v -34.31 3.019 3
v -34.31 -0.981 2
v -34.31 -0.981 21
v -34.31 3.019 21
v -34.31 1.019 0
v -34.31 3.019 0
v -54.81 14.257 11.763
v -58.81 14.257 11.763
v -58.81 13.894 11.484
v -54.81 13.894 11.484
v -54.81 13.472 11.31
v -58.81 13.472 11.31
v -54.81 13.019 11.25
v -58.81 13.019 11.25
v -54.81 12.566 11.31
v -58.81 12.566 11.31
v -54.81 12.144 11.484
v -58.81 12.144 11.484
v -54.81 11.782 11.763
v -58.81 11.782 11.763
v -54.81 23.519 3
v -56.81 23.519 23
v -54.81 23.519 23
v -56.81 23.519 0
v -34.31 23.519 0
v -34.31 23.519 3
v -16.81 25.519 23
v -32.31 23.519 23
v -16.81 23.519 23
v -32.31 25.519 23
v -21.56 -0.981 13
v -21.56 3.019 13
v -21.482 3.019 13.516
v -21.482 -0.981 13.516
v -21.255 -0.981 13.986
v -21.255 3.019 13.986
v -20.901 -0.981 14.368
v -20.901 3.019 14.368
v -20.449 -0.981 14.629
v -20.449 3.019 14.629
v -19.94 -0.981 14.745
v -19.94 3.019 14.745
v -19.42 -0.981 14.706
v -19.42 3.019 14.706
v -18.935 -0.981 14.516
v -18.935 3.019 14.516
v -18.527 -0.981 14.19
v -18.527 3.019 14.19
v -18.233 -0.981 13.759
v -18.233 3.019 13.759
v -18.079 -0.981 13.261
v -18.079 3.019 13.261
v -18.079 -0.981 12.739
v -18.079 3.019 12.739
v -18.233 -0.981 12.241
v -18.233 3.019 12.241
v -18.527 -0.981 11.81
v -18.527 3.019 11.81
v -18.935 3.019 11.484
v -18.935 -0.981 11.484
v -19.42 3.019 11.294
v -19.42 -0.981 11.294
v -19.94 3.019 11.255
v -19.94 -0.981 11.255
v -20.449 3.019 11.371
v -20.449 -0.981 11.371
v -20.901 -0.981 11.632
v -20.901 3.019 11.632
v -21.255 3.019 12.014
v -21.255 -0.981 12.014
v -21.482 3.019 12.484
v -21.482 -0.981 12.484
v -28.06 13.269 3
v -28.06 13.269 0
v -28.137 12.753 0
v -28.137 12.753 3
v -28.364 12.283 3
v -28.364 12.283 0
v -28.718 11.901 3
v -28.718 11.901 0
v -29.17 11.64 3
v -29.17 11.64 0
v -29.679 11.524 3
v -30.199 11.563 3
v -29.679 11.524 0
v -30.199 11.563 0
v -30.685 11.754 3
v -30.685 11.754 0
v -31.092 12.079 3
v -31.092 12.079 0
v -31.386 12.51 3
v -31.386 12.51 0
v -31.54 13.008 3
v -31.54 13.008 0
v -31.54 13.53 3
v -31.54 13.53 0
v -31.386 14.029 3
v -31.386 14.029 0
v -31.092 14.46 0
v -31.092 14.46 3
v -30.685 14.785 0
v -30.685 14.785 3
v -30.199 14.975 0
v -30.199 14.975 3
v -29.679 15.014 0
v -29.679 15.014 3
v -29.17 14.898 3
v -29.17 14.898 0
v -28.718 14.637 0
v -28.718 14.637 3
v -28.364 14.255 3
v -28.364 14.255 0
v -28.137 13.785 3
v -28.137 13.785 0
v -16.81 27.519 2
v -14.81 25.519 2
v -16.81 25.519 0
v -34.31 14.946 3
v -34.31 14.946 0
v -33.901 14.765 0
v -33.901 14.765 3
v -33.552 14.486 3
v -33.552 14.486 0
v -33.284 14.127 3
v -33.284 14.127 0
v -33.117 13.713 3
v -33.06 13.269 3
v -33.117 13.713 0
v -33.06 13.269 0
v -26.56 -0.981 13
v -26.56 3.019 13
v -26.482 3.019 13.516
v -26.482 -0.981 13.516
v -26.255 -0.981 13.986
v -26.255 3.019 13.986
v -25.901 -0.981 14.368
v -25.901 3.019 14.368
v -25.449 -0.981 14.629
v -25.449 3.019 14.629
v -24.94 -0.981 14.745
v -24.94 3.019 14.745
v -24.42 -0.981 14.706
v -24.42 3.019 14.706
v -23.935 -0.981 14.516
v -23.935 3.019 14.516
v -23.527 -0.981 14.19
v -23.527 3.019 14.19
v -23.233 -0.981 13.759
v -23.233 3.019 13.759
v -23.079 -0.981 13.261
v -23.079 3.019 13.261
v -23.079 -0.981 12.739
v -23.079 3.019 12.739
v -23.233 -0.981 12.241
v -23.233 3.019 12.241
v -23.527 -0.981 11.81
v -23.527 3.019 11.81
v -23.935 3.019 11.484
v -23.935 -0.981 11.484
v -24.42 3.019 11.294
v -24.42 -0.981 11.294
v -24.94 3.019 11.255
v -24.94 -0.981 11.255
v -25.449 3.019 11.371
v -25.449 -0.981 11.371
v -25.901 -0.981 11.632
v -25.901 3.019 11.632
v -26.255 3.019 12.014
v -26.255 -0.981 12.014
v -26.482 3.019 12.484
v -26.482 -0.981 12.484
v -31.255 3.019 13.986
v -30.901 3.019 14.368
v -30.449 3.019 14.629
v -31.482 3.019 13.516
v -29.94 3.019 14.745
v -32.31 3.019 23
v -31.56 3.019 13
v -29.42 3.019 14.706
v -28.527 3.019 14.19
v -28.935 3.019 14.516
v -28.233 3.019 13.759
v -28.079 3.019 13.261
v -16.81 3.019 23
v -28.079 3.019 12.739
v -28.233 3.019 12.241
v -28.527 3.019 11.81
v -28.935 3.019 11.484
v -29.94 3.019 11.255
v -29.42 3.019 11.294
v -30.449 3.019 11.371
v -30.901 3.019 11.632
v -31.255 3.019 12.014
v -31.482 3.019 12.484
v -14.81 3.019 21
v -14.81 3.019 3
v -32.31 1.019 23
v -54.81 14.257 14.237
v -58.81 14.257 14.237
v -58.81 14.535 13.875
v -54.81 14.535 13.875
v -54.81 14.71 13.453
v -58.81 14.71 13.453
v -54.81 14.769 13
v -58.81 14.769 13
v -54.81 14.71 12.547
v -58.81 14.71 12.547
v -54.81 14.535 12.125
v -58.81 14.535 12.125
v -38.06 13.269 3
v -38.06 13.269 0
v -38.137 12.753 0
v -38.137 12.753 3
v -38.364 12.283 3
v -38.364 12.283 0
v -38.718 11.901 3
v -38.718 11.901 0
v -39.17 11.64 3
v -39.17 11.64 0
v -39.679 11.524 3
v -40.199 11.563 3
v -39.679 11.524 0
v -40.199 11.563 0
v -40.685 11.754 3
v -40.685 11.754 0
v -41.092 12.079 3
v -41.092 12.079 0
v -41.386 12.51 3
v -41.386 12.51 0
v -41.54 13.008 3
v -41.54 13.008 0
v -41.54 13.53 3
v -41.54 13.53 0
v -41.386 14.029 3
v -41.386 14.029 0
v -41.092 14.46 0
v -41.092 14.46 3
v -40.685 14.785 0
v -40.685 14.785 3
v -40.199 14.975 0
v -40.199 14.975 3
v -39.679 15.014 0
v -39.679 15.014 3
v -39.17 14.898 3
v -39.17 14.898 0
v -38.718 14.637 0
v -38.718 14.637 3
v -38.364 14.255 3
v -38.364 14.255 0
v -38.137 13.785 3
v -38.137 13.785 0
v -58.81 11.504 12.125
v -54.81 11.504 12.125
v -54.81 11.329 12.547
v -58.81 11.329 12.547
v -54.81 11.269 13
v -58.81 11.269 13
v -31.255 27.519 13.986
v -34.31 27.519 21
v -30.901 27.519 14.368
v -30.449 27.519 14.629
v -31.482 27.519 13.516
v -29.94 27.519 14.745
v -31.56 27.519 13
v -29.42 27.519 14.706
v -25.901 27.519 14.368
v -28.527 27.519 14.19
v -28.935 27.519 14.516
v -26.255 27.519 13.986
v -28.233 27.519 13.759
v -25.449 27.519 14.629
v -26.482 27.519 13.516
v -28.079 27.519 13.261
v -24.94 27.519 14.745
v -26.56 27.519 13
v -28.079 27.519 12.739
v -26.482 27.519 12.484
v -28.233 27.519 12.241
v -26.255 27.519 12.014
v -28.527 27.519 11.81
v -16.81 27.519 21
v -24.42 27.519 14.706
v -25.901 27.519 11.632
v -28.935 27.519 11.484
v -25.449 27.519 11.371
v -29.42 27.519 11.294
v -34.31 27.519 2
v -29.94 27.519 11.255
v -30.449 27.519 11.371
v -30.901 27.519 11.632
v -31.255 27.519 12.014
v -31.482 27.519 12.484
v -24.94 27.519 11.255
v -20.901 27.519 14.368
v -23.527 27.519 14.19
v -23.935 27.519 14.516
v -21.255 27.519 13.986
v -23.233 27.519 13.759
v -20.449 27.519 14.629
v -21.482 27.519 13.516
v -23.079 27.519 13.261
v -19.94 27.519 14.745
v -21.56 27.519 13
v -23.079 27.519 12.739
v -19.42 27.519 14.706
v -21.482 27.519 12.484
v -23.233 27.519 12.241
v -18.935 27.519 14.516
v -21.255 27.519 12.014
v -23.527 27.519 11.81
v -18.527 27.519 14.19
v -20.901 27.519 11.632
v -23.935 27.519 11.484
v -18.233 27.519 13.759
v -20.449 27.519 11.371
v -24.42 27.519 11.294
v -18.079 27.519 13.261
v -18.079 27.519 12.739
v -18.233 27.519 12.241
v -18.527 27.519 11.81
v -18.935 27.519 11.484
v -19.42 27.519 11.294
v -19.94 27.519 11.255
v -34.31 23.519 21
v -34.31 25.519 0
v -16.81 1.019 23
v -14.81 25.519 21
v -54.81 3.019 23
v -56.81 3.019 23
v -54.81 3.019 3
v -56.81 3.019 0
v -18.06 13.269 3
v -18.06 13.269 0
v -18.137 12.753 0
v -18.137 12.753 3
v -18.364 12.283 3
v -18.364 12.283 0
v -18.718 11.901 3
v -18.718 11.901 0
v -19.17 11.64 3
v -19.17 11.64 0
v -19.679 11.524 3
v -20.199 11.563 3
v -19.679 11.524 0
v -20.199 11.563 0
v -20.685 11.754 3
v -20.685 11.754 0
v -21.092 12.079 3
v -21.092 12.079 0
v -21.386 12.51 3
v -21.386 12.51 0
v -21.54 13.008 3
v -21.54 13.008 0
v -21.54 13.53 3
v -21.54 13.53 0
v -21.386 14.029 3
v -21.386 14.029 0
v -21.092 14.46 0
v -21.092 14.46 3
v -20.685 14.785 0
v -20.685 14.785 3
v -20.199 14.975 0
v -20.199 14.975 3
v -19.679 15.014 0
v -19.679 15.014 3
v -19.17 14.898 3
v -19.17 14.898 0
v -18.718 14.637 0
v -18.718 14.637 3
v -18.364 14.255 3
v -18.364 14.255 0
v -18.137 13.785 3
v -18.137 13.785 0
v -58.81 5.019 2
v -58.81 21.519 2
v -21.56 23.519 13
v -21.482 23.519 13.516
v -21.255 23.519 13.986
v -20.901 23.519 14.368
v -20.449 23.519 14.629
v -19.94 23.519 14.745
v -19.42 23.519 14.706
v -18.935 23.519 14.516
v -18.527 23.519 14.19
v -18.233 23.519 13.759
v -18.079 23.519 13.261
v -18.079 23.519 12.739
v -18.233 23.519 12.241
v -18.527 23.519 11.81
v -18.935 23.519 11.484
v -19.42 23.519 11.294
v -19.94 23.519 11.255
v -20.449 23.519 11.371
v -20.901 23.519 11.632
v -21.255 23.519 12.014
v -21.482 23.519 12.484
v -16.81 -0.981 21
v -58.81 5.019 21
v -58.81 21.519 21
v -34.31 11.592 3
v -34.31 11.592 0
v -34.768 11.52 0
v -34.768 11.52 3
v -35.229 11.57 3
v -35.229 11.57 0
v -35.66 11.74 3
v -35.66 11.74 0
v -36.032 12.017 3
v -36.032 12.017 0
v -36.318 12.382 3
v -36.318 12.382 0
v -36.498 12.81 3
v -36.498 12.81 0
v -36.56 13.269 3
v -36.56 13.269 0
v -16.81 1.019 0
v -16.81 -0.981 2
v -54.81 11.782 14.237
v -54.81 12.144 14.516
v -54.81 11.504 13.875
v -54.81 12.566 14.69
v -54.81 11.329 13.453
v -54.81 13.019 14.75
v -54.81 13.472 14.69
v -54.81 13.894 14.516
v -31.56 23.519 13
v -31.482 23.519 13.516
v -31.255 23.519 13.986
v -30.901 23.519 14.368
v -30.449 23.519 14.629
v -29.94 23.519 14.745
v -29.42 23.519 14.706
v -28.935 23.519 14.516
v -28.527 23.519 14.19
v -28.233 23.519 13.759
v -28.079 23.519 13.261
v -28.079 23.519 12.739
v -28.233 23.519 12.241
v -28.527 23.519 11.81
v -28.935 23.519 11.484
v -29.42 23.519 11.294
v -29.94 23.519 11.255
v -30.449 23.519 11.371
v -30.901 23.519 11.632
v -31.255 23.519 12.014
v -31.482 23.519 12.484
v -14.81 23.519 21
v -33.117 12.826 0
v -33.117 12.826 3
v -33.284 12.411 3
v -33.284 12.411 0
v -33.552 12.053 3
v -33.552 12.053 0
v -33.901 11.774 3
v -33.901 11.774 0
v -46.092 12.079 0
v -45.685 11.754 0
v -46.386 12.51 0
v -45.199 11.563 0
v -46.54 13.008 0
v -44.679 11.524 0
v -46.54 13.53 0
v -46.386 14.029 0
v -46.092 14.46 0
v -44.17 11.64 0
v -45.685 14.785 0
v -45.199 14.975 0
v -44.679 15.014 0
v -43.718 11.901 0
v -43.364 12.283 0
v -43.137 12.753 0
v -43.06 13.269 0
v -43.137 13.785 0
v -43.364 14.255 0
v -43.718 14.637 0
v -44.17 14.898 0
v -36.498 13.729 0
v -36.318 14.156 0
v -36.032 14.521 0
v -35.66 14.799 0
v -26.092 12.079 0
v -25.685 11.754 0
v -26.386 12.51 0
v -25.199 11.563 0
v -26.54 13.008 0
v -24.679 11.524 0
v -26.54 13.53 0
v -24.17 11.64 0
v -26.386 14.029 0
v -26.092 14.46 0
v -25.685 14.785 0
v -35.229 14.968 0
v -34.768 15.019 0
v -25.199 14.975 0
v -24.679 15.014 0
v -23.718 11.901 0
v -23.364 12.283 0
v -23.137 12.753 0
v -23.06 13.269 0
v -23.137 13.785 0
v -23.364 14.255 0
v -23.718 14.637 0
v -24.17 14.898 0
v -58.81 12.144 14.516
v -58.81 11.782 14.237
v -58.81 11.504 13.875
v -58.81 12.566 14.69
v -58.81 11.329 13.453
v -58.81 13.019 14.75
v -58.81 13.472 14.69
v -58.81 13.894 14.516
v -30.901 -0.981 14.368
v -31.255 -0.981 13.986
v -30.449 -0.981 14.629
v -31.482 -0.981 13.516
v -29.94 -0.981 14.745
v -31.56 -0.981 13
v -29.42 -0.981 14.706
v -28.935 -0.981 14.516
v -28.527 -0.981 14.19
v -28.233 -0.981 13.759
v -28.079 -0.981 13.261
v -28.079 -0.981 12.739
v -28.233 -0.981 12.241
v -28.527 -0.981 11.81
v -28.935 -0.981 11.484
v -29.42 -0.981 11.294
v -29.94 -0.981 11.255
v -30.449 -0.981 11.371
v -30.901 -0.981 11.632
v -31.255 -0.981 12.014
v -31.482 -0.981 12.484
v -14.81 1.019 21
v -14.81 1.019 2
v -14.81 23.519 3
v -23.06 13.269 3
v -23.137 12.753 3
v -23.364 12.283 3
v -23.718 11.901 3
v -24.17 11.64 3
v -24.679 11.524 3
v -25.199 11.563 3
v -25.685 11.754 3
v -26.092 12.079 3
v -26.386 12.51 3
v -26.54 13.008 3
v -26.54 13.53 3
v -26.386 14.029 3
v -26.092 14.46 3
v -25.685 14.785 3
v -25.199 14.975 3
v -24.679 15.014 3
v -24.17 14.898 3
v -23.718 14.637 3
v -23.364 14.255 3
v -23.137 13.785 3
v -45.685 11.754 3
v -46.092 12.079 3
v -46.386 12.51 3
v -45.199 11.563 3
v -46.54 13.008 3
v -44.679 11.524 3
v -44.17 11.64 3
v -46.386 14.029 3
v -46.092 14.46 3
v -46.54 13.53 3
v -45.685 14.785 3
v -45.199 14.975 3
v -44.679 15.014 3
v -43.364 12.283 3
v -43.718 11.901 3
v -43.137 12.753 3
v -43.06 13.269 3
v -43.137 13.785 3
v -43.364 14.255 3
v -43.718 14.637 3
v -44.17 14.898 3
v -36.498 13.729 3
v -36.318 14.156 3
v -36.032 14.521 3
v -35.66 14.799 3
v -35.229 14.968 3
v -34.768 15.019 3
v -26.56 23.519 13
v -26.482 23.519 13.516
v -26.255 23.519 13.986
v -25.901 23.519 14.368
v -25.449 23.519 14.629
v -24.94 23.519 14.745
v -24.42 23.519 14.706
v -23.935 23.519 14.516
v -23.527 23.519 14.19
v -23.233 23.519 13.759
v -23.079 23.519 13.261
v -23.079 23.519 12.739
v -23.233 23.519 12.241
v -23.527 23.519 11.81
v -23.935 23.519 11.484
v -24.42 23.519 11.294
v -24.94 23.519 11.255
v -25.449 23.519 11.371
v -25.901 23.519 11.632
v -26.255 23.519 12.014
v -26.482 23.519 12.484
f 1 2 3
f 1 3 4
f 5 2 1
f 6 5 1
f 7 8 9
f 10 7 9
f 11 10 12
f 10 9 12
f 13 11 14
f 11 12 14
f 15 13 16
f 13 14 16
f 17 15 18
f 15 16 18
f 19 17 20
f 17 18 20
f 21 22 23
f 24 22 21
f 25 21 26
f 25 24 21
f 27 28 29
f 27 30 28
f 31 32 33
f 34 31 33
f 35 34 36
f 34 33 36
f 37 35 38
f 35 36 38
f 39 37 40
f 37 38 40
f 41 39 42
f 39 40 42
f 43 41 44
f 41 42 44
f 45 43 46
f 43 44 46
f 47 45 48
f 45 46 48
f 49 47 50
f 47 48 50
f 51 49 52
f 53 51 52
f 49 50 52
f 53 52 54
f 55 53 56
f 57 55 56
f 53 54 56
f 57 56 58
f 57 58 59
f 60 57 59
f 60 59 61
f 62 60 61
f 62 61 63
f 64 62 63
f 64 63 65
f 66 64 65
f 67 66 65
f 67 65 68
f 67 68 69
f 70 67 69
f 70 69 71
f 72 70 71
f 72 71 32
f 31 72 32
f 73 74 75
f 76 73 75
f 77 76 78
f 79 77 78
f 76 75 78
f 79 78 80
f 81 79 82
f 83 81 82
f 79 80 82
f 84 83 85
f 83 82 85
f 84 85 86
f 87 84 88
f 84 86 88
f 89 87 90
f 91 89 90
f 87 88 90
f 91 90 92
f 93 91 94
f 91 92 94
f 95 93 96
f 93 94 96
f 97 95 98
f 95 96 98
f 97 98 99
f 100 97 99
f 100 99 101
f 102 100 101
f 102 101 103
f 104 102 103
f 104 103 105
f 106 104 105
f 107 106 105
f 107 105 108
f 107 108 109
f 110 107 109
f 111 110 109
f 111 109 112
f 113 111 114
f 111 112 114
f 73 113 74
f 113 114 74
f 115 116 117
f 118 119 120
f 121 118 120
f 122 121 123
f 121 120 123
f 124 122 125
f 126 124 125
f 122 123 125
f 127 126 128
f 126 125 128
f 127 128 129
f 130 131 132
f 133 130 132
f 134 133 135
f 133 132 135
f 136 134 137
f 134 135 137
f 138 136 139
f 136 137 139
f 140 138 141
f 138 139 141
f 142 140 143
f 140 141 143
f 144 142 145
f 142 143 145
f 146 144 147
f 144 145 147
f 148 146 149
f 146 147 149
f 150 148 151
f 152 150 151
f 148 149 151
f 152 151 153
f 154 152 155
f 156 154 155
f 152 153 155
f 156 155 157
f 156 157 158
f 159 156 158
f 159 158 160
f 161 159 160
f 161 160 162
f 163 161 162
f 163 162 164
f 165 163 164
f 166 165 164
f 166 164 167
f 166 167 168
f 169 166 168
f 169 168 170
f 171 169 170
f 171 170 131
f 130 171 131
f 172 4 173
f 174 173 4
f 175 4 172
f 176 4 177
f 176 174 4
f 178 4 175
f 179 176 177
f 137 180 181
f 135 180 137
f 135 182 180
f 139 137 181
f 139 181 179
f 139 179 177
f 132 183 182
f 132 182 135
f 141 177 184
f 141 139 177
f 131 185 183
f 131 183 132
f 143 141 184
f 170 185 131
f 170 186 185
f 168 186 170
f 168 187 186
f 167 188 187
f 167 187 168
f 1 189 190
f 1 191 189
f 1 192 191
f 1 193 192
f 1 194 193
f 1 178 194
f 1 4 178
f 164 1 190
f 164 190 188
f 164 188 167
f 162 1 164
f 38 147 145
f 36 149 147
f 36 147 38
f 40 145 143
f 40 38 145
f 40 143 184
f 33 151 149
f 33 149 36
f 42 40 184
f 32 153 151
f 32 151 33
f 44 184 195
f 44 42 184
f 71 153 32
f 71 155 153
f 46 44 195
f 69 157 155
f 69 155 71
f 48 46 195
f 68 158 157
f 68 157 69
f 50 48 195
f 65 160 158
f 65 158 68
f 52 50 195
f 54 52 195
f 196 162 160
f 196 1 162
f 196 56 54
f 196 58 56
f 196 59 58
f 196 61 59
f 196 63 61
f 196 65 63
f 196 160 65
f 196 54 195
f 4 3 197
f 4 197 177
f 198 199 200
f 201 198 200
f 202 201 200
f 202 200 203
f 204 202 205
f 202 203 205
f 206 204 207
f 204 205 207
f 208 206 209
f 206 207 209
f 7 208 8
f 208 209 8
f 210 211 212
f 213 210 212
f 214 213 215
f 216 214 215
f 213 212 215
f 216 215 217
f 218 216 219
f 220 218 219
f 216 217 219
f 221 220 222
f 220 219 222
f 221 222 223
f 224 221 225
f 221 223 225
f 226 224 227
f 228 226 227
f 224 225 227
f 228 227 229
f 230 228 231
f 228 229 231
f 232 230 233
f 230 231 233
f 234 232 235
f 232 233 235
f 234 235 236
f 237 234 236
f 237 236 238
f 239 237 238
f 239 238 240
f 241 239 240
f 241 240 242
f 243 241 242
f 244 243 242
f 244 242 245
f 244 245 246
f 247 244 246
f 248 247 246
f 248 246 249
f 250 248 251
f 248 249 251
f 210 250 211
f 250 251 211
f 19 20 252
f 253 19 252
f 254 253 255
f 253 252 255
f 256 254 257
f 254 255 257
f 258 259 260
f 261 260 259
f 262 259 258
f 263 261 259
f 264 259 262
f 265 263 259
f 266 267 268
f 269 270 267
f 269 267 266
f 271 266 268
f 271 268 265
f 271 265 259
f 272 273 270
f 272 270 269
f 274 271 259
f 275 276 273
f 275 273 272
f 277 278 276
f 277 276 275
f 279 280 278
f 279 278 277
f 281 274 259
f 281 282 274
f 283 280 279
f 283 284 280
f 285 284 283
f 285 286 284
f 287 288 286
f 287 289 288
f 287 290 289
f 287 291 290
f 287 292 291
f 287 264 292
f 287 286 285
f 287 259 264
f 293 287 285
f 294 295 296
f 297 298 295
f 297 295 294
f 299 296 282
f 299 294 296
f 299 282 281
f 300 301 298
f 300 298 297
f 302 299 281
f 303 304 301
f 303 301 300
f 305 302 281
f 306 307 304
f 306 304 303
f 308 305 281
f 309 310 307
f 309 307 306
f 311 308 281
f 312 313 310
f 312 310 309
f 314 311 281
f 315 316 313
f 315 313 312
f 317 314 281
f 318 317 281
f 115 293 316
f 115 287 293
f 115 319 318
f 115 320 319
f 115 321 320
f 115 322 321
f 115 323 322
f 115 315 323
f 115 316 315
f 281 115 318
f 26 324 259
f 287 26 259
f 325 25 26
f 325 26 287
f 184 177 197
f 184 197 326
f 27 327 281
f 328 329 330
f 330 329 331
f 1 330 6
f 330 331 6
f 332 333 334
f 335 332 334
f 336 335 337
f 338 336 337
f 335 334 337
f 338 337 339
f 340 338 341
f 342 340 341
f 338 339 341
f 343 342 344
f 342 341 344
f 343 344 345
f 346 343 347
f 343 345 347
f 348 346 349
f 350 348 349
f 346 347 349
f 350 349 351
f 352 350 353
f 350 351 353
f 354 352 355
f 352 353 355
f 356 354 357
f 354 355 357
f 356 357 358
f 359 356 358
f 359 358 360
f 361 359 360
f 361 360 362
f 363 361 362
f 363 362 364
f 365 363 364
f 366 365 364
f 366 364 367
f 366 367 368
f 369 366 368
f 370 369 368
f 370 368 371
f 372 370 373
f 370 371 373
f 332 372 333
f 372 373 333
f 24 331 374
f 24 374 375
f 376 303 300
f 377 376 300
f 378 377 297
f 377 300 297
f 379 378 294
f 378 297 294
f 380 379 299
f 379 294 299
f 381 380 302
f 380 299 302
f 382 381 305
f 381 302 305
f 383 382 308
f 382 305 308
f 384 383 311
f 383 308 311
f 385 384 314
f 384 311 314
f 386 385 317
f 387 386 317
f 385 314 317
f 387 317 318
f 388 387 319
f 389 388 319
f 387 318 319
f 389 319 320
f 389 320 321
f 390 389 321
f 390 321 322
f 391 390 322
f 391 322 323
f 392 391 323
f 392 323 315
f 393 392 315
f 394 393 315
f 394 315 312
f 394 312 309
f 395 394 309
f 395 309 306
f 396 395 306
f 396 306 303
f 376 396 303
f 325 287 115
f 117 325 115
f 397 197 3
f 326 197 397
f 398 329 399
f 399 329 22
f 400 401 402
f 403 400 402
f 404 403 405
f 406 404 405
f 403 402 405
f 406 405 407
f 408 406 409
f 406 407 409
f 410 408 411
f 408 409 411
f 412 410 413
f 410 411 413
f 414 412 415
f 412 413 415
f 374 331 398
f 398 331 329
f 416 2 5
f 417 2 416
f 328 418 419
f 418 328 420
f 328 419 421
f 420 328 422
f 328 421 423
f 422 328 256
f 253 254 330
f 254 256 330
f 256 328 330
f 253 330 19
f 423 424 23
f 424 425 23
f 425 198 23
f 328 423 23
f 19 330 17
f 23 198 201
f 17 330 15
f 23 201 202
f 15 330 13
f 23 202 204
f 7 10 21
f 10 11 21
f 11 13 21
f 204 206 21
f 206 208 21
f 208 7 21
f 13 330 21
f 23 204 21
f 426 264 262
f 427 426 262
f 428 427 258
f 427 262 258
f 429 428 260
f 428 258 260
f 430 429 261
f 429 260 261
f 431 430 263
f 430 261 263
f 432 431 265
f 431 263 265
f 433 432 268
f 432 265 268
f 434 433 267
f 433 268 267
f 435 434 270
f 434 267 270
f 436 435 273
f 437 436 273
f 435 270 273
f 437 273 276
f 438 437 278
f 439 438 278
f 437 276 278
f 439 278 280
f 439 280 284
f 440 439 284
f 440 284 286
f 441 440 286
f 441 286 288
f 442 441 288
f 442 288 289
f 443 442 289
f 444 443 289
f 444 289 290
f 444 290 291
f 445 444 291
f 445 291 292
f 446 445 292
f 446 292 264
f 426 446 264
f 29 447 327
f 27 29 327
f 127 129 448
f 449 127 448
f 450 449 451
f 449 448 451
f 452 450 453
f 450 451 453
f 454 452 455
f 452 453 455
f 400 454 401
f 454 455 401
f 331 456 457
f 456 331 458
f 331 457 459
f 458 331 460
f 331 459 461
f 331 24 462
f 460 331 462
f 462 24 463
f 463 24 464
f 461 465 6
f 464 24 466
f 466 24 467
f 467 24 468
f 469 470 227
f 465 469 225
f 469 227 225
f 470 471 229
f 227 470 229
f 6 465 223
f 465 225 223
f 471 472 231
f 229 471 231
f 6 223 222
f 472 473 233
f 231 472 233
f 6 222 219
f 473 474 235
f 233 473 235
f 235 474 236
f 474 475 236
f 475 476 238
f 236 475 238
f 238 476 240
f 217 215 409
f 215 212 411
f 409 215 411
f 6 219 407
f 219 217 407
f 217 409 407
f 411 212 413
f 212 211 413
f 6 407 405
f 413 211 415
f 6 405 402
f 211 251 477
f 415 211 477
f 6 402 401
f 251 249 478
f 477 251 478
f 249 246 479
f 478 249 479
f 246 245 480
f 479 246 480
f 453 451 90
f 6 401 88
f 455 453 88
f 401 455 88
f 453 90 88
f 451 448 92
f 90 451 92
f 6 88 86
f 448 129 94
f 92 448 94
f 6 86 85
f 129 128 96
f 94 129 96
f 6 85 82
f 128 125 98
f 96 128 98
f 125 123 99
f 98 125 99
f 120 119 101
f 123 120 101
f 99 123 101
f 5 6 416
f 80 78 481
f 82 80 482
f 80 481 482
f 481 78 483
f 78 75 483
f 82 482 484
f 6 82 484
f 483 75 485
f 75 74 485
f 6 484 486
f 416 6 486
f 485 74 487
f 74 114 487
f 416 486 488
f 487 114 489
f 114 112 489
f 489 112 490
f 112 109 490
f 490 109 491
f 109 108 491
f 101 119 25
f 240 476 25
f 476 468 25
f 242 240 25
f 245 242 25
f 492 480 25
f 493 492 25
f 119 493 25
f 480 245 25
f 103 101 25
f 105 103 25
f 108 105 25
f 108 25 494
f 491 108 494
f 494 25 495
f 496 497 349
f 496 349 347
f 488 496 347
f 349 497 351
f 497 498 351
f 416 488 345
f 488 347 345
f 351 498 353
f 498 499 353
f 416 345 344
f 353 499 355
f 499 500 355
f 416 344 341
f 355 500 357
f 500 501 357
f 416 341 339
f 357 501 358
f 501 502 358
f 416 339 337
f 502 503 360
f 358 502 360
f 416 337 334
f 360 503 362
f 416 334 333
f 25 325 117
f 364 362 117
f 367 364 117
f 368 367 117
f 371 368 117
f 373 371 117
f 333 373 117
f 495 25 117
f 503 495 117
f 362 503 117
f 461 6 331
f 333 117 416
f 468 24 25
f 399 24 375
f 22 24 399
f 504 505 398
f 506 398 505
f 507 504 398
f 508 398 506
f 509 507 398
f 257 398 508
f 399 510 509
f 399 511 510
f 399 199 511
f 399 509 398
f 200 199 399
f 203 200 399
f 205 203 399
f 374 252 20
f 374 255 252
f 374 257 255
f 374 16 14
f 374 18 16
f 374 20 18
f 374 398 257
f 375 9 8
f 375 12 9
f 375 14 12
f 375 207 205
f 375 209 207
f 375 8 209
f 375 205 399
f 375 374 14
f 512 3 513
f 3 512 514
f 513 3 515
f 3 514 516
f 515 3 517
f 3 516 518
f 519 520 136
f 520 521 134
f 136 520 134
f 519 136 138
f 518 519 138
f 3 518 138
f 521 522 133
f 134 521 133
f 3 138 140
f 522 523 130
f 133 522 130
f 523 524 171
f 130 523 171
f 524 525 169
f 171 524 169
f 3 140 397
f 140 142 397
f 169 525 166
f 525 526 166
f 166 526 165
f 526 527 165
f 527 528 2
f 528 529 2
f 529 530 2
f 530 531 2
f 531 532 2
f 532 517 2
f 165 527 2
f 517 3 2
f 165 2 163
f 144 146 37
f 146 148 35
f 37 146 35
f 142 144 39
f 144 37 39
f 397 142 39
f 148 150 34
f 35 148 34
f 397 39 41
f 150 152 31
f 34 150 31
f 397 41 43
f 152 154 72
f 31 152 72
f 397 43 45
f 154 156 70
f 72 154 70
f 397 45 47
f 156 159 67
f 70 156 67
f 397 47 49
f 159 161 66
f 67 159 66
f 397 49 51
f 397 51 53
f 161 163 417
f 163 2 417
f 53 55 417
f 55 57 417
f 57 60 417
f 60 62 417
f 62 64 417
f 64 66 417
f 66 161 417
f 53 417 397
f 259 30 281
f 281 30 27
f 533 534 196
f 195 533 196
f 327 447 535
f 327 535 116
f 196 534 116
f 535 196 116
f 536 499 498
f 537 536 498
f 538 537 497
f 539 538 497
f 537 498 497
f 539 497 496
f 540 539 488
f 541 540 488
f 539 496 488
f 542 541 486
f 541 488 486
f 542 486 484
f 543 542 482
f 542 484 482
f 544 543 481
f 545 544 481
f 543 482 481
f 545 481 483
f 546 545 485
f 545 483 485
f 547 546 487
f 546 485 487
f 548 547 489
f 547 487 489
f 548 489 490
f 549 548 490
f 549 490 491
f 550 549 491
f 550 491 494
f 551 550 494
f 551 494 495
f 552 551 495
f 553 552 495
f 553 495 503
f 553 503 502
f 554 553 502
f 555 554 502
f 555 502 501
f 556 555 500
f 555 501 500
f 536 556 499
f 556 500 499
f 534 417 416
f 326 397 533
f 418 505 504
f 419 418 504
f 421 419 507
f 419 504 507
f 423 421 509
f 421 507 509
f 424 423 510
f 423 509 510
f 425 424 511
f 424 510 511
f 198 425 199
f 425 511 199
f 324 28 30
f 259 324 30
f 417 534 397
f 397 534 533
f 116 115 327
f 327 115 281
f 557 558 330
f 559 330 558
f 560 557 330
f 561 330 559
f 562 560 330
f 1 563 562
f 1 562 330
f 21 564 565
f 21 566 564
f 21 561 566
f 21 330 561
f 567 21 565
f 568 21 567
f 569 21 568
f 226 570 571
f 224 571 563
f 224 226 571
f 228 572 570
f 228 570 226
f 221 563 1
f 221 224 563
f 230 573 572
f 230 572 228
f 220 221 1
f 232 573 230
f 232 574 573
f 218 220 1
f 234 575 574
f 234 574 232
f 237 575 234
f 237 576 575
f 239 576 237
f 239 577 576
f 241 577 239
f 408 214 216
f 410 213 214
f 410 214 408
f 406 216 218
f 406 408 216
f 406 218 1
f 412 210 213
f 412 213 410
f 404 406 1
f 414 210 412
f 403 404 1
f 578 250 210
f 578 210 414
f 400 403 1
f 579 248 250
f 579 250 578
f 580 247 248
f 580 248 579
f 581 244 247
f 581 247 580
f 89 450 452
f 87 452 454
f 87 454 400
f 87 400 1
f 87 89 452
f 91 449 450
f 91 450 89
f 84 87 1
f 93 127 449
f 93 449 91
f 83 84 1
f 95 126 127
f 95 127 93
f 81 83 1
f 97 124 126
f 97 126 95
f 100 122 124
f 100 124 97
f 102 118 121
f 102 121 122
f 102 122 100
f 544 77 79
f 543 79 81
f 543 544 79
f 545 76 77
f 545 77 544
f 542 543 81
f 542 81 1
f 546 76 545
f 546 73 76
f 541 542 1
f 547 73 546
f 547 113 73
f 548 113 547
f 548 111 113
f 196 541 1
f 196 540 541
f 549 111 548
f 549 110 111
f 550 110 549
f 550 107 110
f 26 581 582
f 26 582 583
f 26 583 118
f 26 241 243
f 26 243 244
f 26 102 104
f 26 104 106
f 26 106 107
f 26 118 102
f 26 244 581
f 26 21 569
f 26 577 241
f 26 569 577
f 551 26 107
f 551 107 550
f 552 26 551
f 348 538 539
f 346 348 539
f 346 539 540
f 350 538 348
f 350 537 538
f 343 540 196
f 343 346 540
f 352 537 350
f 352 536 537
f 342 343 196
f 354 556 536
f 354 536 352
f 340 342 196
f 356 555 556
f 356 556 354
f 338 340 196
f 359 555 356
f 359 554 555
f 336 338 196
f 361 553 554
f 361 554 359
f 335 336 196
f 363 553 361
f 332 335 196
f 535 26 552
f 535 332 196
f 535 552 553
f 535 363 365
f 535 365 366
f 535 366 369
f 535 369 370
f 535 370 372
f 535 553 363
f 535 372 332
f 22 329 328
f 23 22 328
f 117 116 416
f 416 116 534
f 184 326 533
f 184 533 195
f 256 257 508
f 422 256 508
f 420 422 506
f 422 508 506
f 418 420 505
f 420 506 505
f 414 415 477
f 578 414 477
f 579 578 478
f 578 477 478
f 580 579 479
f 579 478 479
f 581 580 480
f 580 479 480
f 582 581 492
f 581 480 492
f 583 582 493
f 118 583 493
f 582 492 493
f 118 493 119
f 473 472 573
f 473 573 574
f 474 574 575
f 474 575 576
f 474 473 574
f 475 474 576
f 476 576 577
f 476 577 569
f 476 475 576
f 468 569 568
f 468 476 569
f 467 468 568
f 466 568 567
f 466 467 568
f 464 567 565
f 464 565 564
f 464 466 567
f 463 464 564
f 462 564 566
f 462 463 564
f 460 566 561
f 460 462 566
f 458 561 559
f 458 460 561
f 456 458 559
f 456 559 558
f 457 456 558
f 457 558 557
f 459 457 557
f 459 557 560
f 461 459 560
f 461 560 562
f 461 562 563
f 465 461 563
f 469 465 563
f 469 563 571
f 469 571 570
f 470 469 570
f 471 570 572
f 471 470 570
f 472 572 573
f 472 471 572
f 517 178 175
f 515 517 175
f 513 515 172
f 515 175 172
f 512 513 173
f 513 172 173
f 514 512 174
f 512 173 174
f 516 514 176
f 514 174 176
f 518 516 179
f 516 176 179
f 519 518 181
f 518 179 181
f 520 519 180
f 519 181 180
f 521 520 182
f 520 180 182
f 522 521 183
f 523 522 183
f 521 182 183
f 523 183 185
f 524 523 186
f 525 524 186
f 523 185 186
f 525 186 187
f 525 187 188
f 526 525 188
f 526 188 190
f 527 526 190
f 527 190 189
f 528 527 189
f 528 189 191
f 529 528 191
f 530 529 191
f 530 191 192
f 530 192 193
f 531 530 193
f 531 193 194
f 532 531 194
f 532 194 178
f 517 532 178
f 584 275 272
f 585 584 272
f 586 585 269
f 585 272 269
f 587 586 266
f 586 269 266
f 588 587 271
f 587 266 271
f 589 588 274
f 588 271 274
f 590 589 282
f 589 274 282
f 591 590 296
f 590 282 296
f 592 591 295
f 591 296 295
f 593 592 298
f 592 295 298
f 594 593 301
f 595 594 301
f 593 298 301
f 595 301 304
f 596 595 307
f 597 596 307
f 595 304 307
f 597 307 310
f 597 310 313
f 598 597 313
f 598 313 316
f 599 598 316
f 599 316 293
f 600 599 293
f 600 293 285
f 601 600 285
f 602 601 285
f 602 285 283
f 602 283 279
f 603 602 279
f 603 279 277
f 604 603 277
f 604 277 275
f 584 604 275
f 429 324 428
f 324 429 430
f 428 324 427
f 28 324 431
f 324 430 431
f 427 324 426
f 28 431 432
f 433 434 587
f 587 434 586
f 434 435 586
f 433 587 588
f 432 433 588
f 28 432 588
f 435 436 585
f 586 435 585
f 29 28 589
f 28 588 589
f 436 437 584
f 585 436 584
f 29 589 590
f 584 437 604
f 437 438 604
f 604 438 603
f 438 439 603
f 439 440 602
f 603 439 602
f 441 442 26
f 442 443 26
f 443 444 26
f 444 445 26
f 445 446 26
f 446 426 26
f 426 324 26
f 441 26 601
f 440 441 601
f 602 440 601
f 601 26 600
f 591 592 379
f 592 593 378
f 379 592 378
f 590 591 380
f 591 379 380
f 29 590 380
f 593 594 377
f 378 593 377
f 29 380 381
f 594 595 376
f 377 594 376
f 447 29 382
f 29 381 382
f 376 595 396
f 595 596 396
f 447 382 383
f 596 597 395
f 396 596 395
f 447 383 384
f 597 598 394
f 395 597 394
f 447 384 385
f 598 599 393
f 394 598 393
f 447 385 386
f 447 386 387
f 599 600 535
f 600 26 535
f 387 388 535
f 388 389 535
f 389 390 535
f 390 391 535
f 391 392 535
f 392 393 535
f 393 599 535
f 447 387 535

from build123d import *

# Parameters (mm, degrees)
F0_R     = 1.75
F1_DEPTH = 3
F0_W     = 4
F0_H     = 20.5
F0_W_2   = 19.5
F0_H_2   = 4
F2_DEPTH = 23
F3_R     = 1.75
F4_DEPTH = 28.501
F6_DEPTH = 25
F7_SIZE  = 2


with BuildPart() as f1:
    # F0 (on Top) → F1 (new body)
    with BuildSketch(Plane.XY):
        with BuildLine():
            Line((-34.3095597923, 23.5192315383), (-54.8095597923, 23.5192315383))
            Line((-54.8095597923, 23.5192315383), (-54.8095597923, 3.0192315383))
            Line((-54.8095597923, 3.0192315383), (-34.3095597923, 3.0192315383))
            Line((-34.3095597923, 3.0192315383), (-34.3095597923, 11.5921805552))
            ThreePointArc((-34.3095597923, 11.5921805552), (-35.8553848254, 11.8661100182), (-36.5595597923, 13.2692315383))
            ThreePointArc((-36.5595597923, 13.2692315383), (-35.8553848254, 14.6723530583), (-34.3095597923, 14.9462825214))
            Line((-34.3095597923, 14.9462825214), (-34.3095597923, 23.5192315383))
        make_face()
        with Locations((-44.8095597923, 13.2692315383)):
            Circle(F0_R, mode=Mode.SUBTRACT)
        with BuildLine():
            ThreePointArc((-41.5595597923, 13.2692315383), (-39.8095597923, 15.0192315383), (-38.0595597923, 13.2692315383))
            ThreePointArc((-38.0595597923, 13.2692315383), (-39.8095597923, 11.5192315383), (-41.5595597923, 13.2692315383))
        make_face(mode=Mode.SUBTRACT)
        with BuildLine():
            Line((-14.8095597923, 23.5192315383), (-34.3095597923, 23.5192315383))
            Line((-34.3095597923, 23.5192315383), (-34.3095597923, 14.9462825214))
            ThreePointArc((-34.3095597923, 14.9462825214), (-33.4064382722, 14.3150565715), (-33.0595597923, 13.2692315383))
            Line((-33.0595597923, 13.2692315383), (-31.5595597923, 13.2692315383))
            ThreePointArc((-31.5595597923, 13.2692315383), (-29.8095597923, 15.0192315383), (-28.0595597923, 13.2692315383))
            Line((-28.0595597923, 13.2692315383), (-26.5595597923, 13.2692315383))
            ThreePointArc((-26.5595597923, 13.2692315383), (-24.8095597923, 15.0192315383), (-23.0595597923, 13.2692315383))
            Line((-23.0595597923, 13.2692315383), (-21.5595597923, 13.2692315383))
            ThreePointArc((-21.5595597923, 13.2692315383), (-19.8095597923, 15.0192315383), (-18.0595597923, 13.2692315383))
            Line((-18.0595597923, 13.2692315383), (-14.8095597923, 13.2692315383))
            Line((-14.8095597923, 13.2692315383), (-14.8095597923, 23.5192315383))
        make_face()
        with BuildLine():
            Line((-34.3095597923, 11.5921805552), (-34.3095597923, 3.0192315383))
            Line((-34.3095597923, 3.0192315383), (-14.8095597923, 3.0192315383))
            Line((-14.8095597923, 3.0192315383), (-14.8095597923, 13.2692315383))
            Line((-14.8095597923, 13.2692315383), (-18.0595597923, 13.2692315383))
            ThreePointArc((-18.0595597923, 13.2692315383), (-19.8095597923, 11.5192315383), (-21.5595597923, 13.2692315383))
            Line((-21.5595597923, 13.2692315383), (-23.0595597923, 13.2692315383))
            ThreePointArc((-23.0595597923, 13.2692315383), (-24.8095597923, 11.5192315383), (-26.5595597923, 13.2692315383))
            Line((-26.5595597923, 13.2692315383), (-28.0595597923, 13.2692315383))
            ThreePointArc((-28.0595597923, 13.2692315383), (-29.8095597923, 11.5192315383), (-31.5595597923, 13.2692315383))
            Line((-31.5595597923, 13.2692315383), (-33.0595597923, 13.2692315383))
            ThreePointArc((-33.0595597923, 13.2692315383), (-33.4064382722, 12.2234065051), (-34.3095597923, 11.5921805552))
        make_face()
    extrude(amount=F1_DEPTH)

    # F0 (on Top) → F2 (join)
    with BuildSketch(Plane.XY):
        with Locations((-56.8095597923, 13.2692315383)):
            Rectangle(F0_W, F0_H)
        with Locations((-24.5595597923, 1.0192315383)):
            Rectangle(F0_W_2, F0_H_2)
        with Locations((-24.5595597923, 25.5192315383)):
            Rectangle(F0_W_2, F0_H_2)
    extrude(amount=F2_DEPTH)

    # F3 (on face) → F4 (cut, through all)
    with BuildSketch(Plane(origin=(0, 27.5192315383, 0), x_dir=(-1, 0, 0), z_dir=(0, 1, 0))):
        with Locations((19.8095597923, 13)):
            Circle(F3_R)
        with Locations((24.8095597923, 13)):
            Circle(F3_R)
        with Locations((29.8095597923, 13)):
            Circle(F3_R)
        with Locations((39.8095597923, 13)):
            Circle(F3_R)
        with Locations((44.8095597923, 13)):
            Circle(F3_R)
        with Locations((49.8095597923, 13)):
            Circle(F3_R)
    extrude(amount=-F4_DEPTH, mode=Mode.SUBTRACT)

    # F5 (on face) → F6 (cut)
    with BuildSketch(Plane(origin=(-58.8095597923, 0, 0), x_dir=(0, -1, 0), z_dir=(-1, 0, 0))):
        with BuildLine():
            Line((-13.0192315383, 13), (-11.7817946712, 14.2374368671))
            ThreePointArc((-11.7817946712, 14.2374368671), (-13.0192315383, 14.75), (-14.2566684054, 14.2374368671))
            Line((-14.2566684054, 14.2374368671), (-13.0192315383, 13))
        make_face()
        with BuildLine():
            ThreePointArc((-14.2566684054, 11.7625631329), (-13.0192315383, 11.25), (-11.7817946712, 11.7625631329))
            Line((-11.7817946712, 11.7625631329), (-13.0192315383, 13))
            Line((-13.0192315383, 13), (-14.2566684054, 11.7625631329))
        make_face()
        with BuildLine():
            ThreePointArc((-11.2692315383, 13), (-11.4024423564, 13.6696960066), (-11.7817946712, 14.2374368671))
            Line((-11.7817946712, 14.2374368671), (-13.0192315383, 13))
            Line((-13.0192315383, 13), (-11.7817946712, 11.7625631329))
            ThreePointArc((-11.7817946712, 11.7625631329), (-11.4024423564, 12.3303039934), (-11.2692315383, 13))
        make_face()
        with BuildLine():
            Line((-13.0192315383, 13), (-14.2566684054, 14.2374368671))
            ThreePointArc((-14.2566684054, 14.2374368671), (-14.7692315383, 13), (-14.2566684054, 11.7625631329))
            Line((-14.2566684054, 11.7625631329), (-13.0192315383, 13))
        make_face()
    extrude(amount=-F6_DEPTH, mode=Mode.SUBTRACT)

    # F7
    f7_edges = [f1.edges().sort_by_distance(p)[0] for p in [
        (-24.55956, -0.980768, 23),
        (-14.80956, -0.980768, 11.5),
        (-24.55956, -0.980768, 0),
        (-14.80956, 13.269232, 0),
        (-14.80956, 27.519232, 11.5),
        (-14.80956, 1.019232, 23),
        (-14.80956, 25.519232, 23),
        (-24.55956, 27.519232, 23),
        (-34.30956, 25.519232, 23),
        (-34.30956, 1.019232, 23),
        (-24.55956, 27.519232, 0),
        (-58.80956, 23.519232, 11.5),
        (-58.80956, 3.019232, 11.5),
        (-58.80956, 13.269232, 23),
        (-58.80956, 13.269232, 0),
    ]]
    chamfer(f7_edges, length=F7_SIZE)


solid = f1.part
